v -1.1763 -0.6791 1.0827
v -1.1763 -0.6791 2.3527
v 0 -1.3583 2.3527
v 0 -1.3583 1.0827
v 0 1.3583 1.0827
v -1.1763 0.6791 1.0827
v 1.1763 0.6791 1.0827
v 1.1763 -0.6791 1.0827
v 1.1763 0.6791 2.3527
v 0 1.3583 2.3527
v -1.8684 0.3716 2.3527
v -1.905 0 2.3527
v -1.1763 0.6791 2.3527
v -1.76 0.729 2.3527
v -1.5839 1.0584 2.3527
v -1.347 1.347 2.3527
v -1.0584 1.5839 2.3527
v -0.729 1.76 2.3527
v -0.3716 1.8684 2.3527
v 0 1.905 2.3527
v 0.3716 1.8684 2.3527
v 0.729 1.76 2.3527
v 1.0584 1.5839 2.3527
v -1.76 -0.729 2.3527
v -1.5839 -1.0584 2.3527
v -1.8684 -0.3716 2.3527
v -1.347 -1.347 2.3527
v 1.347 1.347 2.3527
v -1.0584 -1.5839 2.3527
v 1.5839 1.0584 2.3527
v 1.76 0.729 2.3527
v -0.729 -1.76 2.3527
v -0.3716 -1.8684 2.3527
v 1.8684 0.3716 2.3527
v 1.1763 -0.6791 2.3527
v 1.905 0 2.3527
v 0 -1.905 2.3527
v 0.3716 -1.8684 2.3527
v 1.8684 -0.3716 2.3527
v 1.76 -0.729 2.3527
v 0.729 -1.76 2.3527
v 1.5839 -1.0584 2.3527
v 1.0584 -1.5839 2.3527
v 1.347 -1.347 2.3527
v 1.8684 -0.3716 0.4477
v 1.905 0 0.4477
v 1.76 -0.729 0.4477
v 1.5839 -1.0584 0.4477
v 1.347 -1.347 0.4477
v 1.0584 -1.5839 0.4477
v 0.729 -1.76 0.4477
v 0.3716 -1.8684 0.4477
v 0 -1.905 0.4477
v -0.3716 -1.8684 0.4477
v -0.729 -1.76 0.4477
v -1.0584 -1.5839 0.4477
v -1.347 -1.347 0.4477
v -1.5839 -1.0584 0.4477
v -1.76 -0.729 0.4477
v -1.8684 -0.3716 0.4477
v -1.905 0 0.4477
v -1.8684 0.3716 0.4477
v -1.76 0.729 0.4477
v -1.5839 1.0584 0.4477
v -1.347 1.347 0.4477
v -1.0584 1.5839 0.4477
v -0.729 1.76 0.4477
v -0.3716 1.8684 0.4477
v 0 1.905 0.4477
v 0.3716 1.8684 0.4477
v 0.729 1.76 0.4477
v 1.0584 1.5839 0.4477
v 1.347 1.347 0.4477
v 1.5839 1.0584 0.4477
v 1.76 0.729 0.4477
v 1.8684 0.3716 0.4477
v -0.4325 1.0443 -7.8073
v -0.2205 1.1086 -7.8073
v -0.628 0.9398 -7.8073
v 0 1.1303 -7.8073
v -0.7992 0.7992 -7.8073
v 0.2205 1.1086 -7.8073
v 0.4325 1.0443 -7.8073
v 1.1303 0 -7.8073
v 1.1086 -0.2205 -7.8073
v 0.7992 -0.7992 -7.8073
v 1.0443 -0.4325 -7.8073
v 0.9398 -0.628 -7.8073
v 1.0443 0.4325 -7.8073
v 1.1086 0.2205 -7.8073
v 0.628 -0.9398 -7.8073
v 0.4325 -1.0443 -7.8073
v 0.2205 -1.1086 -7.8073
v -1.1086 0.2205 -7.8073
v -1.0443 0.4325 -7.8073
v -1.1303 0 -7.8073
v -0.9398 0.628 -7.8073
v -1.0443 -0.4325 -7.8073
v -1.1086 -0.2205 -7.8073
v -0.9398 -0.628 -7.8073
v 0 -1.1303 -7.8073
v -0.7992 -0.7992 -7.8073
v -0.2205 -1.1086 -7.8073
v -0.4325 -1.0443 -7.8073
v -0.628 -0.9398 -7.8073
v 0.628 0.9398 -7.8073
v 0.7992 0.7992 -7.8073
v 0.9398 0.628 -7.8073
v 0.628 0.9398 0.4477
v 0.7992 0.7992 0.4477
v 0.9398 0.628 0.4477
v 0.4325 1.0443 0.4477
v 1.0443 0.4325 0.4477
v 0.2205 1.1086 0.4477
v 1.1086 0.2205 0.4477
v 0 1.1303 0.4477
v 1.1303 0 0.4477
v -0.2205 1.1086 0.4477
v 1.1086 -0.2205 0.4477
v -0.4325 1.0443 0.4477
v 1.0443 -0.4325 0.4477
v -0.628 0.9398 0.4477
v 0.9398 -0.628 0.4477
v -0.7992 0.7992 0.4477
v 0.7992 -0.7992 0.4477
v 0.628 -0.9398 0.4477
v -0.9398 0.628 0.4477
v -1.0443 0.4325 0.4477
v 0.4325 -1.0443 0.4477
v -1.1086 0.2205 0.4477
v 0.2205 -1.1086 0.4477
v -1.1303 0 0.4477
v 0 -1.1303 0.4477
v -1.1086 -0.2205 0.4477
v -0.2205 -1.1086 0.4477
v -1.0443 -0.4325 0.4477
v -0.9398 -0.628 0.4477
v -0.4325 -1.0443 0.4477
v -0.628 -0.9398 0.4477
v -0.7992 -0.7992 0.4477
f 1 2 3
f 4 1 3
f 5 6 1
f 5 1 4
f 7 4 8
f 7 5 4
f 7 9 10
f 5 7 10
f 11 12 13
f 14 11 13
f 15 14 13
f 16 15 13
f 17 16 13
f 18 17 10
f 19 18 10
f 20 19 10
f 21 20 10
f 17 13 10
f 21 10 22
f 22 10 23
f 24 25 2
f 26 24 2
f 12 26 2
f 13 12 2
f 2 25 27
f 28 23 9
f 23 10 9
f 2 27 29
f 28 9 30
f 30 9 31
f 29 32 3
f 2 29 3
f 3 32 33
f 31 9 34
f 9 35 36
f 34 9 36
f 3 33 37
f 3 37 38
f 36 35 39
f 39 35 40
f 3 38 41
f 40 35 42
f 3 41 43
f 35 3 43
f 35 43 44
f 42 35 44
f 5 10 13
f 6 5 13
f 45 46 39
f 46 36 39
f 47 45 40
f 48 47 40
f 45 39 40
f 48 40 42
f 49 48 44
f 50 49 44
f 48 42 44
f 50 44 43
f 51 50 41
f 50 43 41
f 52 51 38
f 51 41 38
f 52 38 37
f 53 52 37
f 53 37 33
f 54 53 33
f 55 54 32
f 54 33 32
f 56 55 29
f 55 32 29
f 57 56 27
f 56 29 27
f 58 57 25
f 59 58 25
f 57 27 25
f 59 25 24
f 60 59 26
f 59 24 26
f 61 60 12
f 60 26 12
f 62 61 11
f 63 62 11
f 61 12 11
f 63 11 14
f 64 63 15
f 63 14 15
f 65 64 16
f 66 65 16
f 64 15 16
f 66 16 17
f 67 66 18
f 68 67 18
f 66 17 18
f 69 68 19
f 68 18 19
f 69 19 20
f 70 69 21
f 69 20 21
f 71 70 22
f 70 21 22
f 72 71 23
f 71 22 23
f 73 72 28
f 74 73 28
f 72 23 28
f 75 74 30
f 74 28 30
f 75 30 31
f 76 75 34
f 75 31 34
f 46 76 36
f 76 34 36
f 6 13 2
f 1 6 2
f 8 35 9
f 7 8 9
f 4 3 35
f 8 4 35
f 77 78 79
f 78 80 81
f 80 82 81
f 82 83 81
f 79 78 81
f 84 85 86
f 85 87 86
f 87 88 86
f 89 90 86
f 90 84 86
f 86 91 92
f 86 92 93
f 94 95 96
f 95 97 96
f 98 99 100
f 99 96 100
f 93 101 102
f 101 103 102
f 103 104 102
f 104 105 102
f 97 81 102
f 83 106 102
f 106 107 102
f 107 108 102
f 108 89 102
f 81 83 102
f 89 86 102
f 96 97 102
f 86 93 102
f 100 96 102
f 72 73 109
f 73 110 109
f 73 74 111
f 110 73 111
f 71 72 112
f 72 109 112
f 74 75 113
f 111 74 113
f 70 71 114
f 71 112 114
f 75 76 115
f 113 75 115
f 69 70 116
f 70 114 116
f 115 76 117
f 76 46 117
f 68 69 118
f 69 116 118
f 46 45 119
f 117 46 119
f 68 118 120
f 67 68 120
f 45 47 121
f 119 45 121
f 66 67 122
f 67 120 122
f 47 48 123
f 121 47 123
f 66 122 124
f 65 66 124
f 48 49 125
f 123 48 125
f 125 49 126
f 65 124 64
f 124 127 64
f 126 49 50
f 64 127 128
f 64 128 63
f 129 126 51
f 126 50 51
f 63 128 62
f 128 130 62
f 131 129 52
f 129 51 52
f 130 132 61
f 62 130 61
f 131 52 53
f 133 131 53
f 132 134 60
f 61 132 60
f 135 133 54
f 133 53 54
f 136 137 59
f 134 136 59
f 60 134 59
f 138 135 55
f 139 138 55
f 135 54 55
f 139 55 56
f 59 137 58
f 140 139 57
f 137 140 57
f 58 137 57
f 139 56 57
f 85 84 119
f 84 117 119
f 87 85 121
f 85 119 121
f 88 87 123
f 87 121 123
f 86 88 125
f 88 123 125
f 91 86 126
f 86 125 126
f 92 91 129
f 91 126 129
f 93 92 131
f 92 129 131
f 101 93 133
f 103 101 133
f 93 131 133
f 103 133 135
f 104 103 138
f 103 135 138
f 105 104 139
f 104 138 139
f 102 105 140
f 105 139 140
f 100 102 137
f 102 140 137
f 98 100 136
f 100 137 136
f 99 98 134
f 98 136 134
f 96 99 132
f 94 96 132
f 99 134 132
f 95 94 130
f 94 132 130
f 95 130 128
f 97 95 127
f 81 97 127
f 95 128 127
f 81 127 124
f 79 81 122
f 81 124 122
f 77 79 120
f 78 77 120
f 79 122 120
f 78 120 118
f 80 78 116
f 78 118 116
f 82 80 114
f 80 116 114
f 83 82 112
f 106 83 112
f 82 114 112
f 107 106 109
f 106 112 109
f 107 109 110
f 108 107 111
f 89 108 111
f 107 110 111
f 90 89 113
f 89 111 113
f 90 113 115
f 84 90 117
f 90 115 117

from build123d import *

# Parameters (mm, degrees)
F3_DEPTH = 1.27


with BuildPart() as f1:
    # F0 (on Front) → F1 (revolve)
    with BuildSketch(Plane.XZ):
        Polygon((1.905, 2.352728), (0, 2.352728), (0, -7.807272), (1.1303, -7.807272), (1.1303, 0.447728), (1.905, 0.447728), align=None)
    revolve(axis=Axis((0, 0, -2.727272), (0, 0, -1)))

    # F2 (on face) → F3 (cut)
    with BuildSketch(Plane.XY.offset(2.352728)):
        Polygon((-1.176285, 0.679128), (-1.176285, -0.679128), (0, -1.358256), (1.176285, -0.679128), (1.176285, 0.679128), (0, 1.358256), align=None)
    extrude(amount=-F3_DEPTH, mode=Mode.SUBTRACT)


solid = f1.part
